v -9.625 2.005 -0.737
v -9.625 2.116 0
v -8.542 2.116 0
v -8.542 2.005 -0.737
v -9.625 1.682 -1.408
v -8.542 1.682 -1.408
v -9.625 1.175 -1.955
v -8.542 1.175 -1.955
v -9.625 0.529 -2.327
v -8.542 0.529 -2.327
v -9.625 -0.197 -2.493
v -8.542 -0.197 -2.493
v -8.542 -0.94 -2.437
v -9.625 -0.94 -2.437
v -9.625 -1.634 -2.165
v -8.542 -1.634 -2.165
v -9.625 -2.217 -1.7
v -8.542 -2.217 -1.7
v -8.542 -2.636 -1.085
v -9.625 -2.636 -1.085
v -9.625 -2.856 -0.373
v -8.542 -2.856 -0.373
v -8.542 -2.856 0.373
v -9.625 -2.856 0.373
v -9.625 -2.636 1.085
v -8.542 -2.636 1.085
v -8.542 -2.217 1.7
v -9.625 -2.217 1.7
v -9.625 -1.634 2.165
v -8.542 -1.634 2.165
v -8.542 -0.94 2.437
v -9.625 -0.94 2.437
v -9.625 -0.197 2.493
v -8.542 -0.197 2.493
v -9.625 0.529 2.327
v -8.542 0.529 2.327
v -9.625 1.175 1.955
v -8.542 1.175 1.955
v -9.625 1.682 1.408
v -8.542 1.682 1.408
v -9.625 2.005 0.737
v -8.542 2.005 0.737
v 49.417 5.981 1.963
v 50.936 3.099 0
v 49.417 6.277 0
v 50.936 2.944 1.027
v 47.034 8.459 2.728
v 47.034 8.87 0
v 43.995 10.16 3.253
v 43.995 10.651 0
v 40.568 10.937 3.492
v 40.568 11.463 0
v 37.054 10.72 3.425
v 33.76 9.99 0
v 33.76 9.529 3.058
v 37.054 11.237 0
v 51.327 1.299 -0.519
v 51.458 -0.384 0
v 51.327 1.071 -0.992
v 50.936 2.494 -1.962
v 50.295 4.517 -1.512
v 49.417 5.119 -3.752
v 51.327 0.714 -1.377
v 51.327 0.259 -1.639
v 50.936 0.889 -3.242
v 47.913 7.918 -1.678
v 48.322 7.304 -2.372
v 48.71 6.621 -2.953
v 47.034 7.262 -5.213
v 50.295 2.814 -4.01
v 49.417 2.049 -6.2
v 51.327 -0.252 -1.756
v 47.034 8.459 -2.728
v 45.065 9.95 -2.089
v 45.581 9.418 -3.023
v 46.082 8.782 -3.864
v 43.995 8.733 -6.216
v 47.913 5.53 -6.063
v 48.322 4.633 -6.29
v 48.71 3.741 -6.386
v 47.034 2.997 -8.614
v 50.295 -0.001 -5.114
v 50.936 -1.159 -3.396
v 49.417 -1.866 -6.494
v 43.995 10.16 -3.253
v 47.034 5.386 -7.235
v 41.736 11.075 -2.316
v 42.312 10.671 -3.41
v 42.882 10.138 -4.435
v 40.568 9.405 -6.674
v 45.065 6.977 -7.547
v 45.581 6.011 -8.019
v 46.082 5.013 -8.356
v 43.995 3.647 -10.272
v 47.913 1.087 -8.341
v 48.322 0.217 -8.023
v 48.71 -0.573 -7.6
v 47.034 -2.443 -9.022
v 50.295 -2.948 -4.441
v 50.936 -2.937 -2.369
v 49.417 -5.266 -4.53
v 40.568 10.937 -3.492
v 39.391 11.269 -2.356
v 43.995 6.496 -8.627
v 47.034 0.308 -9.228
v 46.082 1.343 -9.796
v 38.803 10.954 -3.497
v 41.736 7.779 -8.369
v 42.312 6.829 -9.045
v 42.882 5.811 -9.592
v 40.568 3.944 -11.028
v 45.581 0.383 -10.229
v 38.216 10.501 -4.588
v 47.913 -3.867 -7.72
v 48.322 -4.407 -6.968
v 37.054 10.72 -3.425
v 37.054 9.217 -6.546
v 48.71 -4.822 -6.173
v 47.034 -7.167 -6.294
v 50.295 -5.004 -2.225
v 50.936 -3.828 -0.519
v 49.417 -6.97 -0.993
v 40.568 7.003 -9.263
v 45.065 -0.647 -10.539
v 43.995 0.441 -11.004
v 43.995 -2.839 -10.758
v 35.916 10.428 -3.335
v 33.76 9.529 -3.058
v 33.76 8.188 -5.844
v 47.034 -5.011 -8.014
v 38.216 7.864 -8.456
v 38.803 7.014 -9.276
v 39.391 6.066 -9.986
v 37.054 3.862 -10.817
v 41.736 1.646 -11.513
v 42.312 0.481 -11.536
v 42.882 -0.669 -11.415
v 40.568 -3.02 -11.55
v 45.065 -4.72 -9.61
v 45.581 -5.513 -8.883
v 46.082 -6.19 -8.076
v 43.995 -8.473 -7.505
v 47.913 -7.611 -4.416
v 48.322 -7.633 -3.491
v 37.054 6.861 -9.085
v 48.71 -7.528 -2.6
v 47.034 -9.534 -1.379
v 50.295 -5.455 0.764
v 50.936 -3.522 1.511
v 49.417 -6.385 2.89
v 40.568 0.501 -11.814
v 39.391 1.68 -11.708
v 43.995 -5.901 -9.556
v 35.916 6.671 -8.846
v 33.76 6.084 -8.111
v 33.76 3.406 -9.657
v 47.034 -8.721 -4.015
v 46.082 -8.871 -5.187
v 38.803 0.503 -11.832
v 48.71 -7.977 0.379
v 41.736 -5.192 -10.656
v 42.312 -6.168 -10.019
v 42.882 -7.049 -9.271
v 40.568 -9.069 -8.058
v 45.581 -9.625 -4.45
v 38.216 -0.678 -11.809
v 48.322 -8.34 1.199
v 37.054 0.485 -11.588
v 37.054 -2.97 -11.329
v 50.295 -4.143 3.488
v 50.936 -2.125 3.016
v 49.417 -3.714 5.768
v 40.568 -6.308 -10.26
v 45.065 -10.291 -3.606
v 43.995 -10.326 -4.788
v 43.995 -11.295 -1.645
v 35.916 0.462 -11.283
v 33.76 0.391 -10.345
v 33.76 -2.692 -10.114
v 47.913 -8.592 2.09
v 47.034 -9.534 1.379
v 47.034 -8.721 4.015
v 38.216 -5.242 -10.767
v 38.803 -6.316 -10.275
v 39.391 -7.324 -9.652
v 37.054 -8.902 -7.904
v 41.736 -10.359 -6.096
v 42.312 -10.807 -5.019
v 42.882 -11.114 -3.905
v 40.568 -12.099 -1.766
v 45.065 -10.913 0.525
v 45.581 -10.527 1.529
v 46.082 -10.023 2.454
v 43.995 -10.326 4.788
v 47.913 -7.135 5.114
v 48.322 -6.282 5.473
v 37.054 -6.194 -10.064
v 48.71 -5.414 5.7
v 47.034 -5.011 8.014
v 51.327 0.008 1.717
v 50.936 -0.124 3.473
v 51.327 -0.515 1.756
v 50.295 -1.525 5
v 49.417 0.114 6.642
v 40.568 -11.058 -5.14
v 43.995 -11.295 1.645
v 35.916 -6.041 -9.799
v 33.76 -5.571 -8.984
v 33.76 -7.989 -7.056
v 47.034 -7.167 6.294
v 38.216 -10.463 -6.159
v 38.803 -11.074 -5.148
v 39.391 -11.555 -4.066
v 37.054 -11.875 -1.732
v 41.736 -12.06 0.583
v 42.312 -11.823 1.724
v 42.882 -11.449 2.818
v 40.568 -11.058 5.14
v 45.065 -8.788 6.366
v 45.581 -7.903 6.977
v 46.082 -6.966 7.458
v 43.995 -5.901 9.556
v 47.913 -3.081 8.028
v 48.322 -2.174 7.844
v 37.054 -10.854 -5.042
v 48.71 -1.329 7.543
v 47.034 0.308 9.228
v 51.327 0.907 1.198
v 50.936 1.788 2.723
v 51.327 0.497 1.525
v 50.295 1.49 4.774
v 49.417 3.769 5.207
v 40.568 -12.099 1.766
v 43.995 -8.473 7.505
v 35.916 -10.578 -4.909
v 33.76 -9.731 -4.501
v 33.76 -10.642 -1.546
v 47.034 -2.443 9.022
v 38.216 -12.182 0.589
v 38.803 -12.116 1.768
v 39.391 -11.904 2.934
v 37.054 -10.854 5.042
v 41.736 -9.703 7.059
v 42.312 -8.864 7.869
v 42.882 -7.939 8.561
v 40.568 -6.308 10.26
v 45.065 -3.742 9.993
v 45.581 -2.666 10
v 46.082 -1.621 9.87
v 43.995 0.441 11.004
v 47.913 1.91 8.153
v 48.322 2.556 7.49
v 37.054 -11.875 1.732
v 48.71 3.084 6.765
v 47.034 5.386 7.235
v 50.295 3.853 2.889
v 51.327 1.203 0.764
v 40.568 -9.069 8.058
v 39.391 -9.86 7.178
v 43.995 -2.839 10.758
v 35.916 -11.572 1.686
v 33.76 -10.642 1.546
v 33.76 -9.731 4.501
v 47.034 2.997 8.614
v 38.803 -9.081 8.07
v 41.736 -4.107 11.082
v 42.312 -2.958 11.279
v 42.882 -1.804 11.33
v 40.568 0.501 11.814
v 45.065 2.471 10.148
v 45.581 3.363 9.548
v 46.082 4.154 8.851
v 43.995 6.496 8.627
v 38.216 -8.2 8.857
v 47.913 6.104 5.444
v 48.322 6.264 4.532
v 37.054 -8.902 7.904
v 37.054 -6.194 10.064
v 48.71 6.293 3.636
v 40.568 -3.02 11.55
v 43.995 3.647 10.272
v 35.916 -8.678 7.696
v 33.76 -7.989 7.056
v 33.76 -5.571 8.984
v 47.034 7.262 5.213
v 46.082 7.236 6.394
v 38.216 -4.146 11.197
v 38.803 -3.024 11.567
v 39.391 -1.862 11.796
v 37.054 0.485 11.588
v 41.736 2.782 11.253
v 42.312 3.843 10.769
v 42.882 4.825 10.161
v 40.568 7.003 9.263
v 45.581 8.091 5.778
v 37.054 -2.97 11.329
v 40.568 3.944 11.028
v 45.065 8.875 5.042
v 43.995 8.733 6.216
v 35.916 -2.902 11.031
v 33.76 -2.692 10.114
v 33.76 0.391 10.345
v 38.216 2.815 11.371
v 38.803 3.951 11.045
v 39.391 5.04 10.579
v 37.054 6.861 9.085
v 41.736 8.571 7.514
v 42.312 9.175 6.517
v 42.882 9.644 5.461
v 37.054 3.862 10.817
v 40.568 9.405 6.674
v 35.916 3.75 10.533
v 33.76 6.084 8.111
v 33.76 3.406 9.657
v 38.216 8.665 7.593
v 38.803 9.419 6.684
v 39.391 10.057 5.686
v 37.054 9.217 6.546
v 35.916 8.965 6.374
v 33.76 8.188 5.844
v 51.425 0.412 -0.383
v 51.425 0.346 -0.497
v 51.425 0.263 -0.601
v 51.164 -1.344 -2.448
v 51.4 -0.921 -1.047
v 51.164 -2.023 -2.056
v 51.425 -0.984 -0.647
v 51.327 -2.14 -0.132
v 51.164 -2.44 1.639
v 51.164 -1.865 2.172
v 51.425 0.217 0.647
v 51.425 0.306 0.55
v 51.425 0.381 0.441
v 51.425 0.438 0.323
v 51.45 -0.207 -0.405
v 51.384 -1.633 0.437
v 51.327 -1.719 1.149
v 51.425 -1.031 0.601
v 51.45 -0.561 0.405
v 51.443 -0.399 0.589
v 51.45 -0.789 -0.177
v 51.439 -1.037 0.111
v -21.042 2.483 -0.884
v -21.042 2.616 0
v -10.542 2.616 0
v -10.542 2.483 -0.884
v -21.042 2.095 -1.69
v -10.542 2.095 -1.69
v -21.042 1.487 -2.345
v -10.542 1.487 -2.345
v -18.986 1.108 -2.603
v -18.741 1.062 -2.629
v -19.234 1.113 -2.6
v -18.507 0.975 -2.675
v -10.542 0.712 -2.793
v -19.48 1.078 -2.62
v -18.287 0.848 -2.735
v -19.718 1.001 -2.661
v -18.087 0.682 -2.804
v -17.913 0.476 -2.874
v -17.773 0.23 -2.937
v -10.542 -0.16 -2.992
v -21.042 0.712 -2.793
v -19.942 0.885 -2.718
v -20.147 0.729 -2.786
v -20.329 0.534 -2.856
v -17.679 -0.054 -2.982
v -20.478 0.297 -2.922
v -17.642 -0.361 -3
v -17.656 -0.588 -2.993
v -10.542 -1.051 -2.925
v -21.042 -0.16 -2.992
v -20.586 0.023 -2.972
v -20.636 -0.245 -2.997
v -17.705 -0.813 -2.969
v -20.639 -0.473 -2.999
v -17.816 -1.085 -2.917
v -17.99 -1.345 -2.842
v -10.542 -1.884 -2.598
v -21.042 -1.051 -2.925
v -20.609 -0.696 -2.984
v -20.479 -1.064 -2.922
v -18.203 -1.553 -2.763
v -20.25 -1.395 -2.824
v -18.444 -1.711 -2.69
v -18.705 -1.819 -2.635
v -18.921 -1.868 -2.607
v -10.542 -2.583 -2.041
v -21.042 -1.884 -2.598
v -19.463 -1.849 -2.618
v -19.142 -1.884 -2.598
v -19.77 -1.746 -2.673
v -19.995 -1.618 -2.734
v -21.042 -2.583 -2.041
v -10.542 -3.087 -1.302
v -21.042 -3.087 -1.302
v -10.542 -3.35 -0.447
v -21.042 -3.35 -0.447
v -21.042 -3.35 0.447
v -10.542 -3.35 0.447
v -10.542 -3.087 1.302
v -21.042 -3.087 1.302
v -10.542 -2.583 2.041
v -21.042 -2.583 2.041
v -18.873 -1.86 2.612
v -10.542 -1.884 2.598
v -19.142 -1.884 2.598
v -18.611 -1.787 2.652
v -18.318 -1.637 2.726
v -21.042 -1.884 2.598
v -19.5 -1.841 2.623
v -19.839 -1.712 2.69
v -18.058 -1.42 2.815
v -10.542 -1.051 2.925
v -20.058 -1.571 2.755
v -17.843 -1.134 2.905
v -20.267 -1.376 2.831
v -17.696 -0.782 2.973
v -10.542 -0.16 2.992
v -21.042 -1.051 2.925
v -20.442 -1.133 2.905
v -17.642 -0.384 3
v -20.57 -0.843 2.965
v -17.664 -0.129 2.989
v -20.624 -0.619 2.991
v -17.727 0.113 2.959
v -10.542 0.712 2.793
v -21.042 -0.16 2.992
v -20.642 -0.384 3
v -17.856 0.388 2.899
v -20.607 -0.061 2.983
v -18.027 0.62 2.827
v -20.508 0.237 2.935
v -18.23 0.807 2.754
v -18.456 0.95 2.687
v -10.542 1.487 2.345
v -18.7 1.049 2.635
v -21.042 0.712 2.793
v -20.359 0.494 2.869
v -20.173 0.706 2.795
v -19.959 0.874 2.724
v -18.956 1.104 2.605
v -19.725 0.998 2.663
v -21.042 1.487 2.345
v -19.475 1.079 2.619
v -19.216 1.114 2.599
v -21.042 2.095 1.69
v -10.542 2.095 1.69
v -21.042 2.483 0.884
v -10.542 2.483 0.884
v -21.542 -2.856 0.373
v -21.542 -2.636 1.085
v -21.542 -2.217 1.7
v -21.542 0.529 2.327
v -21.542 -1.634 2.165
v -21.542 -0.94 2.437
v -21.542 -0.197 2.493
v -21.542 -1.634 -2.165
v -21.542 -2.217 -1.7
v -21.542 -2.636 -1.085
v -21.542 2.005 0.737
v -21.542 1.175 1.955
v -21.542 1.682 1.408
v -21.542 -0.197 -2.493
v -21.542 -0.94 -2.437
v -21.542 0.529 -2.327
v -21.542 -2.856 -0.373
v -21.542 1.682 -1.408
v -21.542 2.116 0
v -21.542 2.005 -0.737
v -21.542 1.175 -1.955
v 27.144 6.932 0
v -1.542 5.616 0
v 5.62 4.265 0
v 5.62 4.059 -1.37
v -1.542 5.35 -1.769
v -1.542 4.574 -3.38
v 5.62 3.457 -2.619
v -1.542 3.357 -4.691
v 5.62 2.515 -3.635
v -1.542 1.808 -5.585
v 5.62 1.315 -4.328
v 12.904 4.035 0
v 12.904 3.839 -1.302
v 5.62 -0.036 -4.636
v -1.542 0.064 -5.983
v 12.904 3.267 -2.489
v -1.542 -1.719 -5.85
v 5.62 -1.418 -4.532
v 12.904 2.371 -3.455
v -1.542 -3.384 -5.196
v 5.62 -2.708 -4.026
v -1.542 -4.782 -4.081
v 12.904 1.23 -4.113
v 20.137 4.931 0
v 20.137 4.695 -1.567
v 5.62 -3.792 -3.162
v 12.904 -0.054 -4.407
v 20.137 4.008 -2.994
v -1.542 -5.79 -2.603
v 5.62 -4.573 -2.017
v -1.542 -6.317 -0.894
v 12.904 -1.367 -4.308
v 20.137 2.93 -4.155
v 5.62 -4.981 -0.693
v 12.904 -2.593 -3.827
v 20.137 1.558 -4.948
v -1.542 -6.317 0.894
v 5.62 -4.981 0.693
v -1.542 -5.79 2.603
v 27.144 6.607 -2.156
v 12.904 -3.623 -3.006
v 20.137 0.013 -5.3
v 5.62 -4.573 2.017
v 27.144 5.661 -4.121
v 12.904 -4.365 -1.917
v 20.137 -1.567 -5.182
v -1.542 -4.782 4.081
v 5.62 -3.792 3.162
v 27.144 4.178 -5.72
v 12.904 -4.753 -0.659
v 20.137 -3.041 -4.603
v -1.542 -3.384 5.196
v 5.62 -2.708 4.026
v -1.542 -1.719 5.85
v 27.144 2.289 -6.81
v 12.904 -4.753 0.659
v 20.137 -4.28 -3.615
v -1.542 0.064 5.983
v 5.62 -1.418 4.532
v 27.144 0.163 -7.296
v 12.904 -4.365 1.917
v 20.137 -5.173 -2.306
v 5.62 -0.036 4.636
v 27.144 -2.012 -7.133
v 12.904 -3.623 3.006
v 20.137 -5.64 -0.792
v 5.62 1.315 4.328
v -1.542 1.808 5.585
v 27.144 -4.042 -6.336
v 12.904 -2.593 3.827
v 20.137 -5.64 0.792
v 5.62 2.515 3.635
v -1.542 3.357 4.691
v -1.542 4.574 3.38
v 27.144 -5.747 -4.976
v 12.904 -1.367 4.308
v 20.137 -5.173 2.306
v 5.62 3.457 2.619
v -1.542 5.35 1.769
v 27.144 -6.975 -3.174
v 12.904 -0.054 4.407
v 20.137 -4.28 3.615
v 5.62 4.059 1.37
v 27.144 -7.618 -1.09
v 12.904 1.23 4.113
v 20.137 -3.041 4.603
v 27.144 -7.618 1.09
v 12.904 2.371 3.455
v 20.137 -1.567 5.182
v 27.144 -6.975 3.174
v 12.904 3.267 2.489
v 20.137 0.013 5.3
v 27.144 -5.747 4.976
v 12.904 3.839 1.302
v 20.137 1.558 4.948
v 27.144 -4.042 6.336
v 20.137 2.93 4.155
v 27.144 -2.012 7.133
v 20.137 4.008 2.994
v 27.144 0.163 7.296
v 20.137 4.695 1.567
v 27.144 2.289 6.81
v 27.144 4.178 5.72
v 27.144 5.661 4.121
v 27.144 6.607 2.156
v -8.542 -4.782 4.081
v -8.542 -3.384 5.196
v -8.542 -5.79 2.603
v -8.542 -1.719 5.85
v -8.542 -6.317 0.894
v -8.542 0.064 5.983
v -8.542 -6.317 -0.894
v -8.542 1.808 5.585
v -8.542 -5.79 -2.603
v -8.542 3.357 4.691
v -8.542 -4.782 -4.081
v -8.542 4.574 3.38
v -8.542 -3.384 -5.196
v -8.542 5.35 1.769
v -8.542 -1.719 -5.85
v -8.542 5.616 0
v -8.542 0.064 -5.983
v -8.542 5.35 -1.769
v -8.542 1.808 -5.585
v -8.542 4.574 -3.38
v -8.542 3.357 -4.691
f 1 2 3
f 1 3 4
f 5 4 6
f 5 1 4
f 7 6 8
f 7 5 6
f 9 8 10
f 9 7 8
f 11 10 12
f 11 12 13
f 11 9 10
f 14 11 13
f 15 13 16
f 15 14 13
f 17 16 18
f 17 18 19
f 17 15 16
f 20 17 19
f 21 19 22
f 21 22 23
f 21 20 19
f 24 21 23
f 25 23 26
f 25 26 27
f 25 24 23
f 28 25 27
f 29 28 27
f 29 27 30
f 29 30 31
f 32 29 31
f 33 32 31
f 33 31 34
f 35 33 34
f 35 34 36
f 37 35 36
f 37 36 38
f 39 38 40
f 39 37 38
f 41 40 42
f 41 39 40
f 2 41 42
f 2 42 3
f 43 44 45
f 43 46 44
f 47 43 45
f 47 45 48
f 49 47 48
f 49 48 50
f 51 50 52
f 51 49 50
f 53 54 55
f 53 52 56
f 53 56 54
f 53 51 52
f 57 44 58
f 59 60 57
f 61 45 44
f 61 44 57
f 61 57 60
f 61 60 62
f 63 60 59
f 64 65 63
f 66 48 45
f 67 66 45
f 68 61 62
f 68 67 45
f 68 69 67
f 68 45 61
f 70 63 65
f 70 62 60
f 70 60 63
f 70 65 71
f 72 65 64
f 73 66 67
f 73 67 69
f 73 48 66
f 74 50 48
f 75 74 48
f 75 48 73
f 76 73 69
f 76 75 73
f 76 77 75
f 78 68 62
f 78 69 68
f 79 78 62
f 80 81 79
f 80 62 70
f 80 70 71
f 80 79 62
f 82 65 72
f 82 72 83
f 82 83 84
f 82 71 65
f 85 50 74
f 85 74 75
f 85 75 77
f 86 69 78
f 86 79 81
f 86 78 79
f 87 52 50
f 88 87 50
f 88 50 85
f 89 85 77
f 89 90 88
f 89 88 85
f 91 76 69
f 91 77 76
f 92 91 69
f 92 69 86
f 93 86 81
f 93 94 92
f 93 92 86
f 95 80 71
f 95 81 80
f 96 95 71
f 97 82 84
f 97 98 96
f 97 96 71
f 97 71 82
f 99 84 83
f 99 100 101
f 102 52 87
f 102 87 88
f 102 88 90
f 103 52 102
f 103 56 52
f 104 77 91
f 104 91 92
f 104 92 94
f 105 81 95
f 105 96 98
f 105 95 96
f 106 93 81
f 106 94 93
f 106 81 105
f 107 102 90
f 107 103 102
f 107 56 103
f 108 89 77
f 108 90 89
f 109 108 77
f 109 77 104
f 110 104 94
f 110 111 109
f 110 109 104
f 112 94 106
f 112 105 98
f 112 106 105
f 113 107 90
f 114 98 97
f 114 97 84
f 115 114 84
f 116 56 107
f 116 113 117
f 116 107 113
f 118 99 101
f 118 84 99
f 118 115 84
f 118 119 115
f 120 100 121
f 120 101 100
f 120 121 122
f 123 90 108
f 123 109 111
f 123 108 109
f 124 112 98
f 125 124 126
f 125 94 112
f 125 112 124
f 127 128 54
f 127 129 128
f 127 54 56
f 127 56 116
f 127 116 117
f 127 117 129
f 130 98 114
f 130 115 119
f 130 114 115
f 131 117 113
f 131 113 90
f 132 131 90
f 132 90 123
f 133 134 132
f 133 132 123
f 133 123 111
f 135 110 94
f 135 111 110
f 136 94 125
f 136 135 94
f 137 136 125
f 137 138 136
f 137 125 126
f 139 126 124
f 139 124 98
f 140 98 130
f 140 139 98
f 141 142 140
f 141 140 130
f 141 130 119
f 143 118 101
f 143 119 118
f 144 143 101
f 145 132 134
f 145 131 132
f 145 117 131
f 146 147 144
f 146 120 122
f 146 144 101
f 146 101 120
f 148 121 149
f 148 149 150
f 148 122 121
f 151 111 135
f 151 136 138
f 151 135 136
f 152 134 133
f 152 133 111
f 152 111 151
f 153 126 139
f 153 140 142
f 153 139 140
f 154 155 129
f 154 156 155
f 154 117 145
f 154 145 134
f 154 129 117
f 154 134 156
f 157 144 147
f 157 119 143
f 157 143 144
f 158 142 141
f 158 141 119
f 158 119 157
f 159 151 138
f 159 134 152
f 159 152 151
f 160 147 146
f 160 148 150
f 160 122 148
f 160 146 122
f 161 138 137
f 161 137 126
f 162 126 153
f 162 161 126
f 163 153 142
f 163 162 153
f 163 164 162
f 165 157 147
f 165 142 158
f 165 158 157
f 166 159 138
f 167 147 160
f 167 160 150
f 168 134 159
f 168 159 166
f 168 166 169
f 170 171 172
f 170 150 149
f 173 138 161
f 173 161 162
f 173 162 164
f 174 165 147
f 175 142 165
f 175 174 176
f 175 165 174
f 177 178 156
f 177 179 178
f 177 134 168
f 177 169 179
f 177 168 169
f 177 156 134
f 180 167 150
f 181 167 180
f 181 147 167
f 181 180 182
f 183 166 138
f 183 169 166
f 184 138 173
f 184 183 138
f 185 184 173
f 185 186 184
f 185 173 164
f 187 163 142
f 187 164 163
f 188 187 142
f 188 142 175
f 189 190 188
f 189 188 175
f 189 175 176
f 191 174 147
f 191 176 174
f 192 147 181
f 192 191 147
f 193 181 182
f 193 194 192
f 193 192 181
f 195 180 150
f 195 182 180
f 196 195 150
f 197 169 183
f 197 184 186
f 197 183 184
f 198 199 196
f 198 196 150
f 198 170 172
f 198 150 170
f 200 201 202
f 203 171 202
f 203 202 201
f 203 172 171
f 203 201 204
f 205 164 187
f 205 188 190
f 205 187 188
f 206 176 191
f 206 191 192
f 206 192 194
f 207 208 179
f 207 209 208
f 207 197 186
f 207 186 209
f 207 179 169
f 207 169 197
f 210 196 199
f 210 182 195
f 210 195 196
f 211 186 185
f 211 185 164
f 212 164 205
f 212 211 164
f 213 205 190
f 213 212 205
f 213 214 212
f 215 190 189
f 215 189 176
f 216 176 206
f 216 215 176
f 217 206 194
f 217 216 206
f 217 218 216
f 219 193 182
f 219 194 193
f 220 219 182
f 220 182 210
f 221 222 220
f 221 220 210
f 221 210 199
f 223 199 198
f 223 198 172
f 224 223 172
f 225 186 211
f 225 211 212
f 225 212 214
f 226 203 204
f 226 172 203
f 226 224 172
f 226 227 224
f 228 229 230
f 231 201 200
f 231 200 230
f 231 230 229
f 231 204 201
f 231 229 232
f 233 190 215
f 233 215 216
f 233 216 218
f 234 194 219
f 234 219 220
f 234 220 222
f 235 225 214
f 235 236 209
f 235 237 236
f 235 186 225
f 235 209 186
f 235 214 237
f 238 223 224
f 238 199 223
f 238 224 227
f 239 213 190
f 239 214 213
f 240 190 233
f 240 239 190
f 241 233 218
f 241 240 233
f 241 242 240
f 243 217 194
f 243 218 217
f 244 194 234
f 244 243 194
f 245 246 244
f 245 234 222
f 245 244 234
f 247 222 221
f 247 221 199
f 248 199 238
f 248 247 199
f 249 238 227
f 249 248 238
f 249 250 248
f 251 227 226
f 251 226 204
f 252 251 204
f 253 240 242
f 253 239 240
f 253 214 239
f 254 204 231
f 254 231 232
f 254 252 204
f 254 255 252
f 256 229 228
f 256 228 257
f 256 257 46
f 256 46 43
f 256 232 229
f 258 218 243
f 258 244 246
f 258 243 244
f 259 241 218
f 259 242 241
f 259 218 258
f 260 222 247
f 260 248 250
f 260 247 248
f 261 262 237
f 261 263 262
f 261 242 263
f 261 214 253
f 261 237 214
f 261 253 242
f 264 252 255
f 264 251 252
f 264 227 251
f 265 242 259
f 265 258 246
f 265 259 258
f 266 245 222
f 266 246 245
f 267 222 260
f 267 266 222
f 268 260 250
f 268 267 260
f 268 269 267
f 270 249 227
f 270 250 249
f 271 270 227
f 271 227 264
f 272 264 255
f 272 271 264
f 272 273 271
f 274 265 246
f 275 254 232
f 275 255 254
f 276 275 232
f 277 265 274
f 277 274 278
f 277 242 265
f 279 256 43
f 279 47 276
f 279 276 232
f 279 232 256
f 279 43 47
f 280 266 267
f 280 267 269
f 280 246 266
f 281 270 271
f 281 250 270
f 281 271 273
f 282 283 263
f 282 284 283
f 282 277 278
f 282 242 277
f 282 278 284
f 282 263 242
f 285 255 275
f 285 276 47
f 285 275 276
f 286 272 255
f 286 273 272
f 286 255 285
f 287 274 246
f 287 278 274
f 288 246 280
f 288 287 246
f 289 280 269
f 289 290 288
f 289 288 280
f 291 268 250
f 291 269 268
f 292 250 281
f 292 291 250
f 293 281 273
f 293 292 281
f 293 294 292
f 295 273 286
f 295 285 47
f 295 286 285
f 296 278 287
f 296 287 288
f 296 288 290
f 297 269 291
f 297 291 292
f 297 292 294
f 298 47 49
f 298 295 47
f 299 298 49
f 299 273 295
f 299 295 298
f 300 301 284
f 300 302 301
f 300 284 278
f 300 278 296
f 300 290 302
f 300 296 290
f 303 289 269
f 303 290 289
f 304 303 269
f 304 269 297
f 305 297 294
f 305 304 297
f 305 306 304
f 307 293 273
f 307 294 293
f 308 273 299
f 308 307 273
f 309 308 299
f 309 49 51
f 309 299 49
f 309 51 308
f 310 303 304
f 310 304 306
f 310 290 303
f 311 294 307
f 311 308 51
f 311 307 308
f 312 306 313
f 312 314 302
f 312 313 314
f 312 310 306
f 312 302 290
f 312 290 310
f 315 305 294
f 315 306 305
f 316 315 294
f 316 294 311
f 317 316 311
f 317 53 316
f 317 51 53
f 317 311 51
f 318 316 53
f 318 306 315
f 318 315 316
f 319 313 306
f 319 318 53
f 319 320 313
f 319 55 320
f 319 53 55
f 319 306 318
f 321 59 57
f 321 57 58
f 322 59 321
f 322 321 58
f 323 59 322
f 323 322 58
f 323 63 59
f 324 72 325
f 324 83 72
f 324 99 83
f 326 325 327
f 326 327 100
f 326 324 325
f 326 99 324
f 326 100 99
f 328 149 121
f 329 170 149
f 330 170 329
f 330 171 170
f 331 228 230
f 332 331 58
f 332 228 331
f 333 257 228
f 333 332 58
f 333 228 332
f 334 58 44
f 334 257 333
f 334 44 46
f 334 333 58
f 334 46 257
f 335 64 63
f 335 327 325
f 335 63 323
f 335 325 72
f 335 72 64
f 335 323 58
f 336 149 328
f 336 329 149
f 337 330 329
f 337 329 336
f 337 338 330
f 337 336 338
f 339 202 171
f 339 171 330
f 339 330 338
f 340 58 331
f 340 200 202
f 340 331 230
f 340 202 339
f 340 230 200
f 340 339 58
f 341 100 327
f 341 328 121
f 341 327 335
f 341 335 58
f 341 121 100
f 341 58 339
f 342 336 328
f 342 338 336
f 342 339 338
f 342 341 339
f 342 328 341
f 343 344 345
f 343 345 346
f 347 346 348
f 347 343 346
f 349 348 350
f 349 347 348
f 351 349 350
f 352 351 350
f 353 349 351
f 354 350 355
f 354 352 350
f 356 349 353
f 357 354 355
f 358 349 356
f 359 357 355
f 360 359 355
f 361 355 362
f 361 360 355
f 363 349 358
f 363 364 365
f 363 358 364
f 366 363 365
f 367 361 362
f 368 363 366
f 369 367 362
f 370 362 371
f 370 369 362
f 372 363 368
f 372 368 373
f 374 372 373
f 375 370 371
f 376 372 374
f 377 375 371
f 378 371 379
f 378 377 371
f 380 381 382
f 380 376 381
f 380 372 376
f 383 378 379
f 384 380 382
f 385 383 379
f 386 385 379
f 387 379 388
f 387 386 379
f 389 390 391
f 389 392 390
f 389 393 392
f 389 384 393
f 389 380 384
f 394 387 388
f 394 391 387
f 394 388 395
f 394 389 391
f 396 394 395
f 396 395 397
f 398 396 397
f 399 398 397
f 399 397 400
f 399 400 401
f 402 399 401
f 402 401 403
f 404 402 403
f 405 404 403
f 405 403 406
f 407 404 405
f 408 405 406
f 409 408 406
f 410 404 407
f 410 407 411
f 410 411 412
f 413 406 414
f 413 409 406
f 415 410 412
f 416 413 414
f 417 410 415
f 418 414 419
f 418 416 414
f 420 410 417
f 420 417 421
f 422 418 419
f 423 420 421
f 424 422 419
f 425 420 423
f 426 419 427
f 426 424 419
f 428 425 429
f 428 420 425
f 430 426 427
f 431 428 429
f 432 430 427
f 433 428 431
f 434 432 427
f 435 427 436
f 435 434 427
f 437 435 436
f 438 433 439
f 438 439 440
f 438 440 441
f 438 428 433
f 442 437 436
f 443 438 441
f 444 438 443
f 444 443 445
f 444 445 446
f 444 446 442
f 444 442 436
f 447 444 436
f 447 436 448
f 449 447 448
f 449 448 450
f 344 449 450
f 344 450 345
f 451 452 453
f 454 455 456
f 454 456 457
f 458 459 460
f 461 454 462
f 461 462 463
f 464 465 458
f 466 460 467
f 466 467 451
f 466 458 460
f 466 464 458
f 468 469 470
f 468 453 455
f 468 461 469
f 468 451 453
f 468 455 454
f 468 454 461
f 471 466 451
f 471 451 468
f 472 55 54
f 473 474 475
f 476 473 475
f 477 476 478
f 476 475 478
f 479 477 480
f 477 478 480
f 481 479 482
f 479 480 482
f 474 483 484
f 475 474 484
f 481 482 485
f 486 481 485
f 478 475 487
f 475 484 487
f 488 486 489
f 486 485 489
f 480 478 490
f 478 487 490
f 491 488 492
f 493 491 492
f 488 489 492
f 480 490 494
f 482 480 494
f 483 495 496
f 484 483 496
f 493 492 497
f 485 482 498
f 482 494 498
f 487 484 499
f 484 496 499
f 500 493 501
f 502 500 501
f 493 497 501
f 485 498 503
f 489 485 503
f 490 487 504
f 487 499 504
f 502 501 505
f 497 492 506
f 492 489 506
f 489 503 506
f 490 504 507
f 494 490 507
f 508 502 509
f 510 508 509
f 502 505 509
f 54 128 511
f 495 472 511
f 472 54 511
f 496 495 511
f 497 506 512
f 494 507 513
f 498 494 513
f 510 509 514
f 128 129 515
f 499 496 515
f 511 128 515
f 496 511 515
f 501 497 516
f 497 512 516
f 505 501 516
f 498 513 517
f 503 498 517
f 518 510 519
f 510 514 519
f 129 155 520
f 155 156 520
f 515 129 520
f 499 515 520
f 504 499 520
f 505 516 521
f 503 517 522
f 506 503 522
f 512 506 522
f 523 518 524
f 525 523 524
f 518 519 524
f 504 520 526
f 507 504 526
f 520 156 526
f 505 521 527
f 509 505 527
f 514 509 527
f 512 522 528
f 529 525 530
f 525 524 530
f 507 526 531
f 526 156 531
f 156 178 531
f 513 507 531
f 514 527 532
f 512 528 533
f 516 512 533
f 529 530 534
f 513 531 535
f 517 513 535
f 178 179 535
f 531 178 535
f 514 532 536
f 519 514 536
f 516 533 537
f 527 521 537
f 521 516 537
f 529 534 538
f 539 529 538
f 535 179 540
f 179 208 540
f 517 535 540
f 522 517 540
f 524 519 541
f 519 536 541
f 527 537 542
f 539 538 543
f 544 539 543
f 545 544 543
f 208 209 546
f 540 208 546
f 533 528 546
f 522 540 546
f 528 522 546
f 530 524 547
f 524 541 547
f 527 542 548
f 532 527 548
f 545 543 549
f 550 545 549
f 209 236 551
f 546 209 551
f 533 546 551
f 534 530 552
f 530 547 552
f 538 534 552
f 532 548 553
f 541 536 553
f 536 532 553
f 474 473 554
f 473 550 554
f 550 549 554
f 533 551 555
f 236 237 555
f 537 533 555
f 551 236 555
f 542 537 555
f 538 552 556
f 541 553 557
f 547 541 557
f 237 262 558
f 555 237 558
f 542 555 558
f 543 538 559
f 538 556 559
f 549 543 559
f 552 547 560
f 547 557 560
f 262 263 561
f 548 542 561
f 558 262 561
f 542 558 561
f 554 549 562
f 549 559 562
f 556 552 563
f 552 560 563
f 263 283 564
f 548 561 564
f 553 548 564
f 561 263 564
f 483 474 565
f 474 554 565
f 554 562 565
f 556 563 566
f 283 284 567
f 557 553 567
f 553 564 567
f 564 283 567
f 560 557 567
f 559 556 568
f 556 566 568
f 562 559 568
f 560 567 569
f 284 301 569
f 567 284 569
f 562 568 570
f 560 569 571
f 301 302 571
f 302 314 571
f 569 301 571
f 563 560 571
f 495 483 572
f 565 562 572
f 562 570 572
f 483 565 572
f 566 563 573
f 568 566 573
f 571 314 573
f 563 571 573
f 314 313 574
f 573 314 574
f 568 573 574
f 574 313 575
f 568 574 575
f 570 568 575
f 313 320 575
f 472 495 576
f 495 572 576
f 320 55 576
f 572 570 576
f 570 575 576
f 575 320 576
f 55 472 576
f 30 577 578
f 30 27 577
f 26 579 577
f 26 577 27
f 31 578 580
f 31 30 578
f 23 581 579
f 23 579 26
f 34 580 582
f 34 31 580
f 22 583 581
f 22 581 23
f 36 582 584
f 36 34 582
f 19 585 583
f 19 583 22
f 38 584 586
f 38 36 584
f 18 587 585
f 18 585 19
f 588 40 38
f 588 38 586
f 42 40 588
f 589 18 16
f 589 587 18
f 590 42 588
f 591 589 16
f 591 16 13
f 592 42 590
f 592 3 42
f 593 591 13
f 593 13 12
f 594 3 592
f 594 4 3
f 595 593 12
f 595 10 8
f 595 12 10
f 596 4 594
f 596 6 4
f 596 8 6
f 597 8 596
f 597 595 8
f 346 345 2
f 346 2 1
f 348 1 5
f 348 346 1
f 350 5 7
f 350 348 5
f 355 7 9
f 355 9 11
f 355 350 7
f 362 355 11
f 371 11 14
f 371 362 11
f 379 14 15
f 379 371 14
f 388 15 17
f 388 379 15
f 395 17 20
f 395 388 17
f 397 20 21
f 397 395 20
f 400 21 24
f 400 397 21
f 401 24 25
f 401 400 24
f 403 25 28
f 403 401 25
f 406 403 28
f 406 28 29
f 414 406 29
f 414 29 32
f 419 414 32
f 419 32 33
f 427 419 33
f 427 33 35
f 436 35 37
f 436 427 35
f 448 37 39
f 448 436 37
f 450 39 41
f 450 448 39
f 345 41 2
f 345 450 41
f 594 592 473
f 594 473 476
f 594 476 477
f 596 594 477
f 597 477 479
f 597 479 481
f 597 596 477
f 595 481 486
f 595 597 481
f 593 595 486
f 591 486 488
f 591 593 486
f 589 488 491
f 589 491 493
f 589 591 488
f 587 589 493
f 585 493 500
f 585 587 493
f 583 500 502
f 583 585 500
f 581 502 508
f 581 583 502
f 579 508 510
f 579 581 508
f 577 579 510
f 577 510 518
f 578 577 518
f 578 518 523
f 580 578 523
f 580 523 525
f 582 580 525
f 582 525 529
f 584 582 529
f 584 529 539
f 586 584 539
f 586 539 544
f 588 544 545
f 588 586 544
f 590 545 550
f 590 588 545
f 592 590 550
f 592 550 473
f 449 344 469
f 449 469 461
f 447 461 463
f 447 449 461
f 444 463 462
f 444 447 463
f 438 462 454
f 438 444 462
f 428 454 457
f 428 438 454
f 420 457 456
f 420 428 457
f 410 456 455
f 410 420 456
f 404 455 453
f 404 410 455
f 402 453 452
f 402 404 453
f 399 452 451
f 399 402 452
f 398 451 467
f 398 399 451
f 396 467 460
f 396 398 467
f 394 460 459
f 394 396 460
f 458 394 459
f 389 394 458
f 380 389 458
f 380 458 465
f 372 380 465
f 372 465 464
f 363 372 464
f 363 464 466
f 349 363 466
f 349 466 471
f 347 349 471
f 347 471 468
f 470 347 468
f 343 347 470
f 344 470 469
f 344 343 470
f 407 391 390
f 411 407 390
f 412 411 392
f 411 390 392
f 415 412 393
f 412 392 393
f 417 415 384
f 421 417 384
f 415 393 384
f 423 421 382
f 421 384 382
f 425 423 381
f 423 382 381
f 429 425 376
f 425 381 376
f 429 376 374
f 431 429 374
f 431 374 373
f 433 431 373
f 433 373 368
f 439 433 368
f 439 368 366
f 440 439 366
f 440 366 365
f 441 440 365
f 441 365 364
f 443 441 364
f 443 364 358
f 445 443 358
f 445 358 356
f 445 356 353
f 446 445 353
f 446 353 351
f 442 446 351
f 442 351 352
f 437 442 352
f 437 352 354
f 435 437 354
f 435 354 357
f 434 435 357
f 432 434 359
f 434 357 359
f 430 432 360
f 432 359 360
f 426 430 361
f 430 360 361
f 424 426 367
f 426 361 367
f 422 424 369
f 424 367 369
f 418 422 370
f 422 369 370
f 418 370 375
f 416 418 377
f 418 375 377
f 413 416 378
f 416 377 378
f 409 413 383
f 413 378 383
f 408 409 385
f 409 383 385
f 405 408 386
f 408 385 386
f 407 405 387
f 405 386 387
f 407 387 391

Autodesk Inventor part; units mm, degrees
ref_plane "YZ Plane" through (0, 0, 0) normal (1, 0, 0) x (0, 1, 0)
ref_plane "XZ Plane" through (0, 0, 0) normal (0, 1, 0) x (-1, 0, 0)
sketch "Skizze1" plane through (0, 0, 0) normal (0, 0, 1) x (1, 0, 0)
  line L0 (51.4579, -0.3839) -> (-27.7559, -0.3839)
  arc A0 (51.4579, -0.3839) -> (33.7598, 9.9902) centre (39.5684, -0.3839) ccw
  arc A1 (-1.5421, 5.6161) -> (33.7598, 9.9902) centre (10.745, 51.0944) ccw
  line L1 (-1.5421, 5.6161) -> (-8.5421, 5.6161)
  line L2 (-8.5421, 5.6161) -> (-8.5421, -0.3839)
  line L3 (-8.5421, 2.1161) -> (-9.6248, 2.1161)
  line L4 (-9.6248, 2.1161) -> (-10.5421, 2.6161)
  line L5 (-10.5421, 2.6161) -> (-21.5421, 2.6161)
  line L6 (-21.5421, 2.6161) -> (-21.5421, -0.3839)
  dimension "d0" = 60
  dimension "d1" = 7
  dimension "d2" = 3
  dimension "d3" = 2.5
  dimension "d4" = 11
  dimension "d5" = 13
  dimension "d6" = 6
revolve "Drehung1" add sketch "Skizze1" angle 360 about axis through (51.4579, -0.3839, 0) along (-1, 0, 0)
chamfer "Fase1" distance 0.5 angle 45 1 edges at (-21.5421, -3.3839, 0)
thread "Gewinde1" size "M6x1" class "6g" standard "ANSI Metrisches M Profil" full length
ref_plane "Arbeitsebene1" through (-16.0421, -0.3839, 3) normal (0, 0, 1) x (1, 0, 0)
sketch "Skizze2" plane through (-16.0421, -0.3839, 3) normal (0, 0, 1) x (1, 0, 0)
  line L0 (-5, 3) -> (-5, -3) projected
  line L1 (5.5, -3) -> (5.5, 3) projected
  line L2 (-5, 3) -> (-5, -3) projected
  line L3 (-5, 3) -> (5.5, 3) projected
  line L4 (-5, -3) -> (5.5, -3) projected
  line L5 (-5.5, -2.5) -> (-5.5, 2.5) projected
  point P0 (-3.1, 0)
  dimension "d14" = 3
  dimension "d15" = 2.4
hole "Bohrung1" at (-19.1421, -0.3839, 3) direction (0, 0, -1) diameter 3 end through all
properties part number "Glocke03"
